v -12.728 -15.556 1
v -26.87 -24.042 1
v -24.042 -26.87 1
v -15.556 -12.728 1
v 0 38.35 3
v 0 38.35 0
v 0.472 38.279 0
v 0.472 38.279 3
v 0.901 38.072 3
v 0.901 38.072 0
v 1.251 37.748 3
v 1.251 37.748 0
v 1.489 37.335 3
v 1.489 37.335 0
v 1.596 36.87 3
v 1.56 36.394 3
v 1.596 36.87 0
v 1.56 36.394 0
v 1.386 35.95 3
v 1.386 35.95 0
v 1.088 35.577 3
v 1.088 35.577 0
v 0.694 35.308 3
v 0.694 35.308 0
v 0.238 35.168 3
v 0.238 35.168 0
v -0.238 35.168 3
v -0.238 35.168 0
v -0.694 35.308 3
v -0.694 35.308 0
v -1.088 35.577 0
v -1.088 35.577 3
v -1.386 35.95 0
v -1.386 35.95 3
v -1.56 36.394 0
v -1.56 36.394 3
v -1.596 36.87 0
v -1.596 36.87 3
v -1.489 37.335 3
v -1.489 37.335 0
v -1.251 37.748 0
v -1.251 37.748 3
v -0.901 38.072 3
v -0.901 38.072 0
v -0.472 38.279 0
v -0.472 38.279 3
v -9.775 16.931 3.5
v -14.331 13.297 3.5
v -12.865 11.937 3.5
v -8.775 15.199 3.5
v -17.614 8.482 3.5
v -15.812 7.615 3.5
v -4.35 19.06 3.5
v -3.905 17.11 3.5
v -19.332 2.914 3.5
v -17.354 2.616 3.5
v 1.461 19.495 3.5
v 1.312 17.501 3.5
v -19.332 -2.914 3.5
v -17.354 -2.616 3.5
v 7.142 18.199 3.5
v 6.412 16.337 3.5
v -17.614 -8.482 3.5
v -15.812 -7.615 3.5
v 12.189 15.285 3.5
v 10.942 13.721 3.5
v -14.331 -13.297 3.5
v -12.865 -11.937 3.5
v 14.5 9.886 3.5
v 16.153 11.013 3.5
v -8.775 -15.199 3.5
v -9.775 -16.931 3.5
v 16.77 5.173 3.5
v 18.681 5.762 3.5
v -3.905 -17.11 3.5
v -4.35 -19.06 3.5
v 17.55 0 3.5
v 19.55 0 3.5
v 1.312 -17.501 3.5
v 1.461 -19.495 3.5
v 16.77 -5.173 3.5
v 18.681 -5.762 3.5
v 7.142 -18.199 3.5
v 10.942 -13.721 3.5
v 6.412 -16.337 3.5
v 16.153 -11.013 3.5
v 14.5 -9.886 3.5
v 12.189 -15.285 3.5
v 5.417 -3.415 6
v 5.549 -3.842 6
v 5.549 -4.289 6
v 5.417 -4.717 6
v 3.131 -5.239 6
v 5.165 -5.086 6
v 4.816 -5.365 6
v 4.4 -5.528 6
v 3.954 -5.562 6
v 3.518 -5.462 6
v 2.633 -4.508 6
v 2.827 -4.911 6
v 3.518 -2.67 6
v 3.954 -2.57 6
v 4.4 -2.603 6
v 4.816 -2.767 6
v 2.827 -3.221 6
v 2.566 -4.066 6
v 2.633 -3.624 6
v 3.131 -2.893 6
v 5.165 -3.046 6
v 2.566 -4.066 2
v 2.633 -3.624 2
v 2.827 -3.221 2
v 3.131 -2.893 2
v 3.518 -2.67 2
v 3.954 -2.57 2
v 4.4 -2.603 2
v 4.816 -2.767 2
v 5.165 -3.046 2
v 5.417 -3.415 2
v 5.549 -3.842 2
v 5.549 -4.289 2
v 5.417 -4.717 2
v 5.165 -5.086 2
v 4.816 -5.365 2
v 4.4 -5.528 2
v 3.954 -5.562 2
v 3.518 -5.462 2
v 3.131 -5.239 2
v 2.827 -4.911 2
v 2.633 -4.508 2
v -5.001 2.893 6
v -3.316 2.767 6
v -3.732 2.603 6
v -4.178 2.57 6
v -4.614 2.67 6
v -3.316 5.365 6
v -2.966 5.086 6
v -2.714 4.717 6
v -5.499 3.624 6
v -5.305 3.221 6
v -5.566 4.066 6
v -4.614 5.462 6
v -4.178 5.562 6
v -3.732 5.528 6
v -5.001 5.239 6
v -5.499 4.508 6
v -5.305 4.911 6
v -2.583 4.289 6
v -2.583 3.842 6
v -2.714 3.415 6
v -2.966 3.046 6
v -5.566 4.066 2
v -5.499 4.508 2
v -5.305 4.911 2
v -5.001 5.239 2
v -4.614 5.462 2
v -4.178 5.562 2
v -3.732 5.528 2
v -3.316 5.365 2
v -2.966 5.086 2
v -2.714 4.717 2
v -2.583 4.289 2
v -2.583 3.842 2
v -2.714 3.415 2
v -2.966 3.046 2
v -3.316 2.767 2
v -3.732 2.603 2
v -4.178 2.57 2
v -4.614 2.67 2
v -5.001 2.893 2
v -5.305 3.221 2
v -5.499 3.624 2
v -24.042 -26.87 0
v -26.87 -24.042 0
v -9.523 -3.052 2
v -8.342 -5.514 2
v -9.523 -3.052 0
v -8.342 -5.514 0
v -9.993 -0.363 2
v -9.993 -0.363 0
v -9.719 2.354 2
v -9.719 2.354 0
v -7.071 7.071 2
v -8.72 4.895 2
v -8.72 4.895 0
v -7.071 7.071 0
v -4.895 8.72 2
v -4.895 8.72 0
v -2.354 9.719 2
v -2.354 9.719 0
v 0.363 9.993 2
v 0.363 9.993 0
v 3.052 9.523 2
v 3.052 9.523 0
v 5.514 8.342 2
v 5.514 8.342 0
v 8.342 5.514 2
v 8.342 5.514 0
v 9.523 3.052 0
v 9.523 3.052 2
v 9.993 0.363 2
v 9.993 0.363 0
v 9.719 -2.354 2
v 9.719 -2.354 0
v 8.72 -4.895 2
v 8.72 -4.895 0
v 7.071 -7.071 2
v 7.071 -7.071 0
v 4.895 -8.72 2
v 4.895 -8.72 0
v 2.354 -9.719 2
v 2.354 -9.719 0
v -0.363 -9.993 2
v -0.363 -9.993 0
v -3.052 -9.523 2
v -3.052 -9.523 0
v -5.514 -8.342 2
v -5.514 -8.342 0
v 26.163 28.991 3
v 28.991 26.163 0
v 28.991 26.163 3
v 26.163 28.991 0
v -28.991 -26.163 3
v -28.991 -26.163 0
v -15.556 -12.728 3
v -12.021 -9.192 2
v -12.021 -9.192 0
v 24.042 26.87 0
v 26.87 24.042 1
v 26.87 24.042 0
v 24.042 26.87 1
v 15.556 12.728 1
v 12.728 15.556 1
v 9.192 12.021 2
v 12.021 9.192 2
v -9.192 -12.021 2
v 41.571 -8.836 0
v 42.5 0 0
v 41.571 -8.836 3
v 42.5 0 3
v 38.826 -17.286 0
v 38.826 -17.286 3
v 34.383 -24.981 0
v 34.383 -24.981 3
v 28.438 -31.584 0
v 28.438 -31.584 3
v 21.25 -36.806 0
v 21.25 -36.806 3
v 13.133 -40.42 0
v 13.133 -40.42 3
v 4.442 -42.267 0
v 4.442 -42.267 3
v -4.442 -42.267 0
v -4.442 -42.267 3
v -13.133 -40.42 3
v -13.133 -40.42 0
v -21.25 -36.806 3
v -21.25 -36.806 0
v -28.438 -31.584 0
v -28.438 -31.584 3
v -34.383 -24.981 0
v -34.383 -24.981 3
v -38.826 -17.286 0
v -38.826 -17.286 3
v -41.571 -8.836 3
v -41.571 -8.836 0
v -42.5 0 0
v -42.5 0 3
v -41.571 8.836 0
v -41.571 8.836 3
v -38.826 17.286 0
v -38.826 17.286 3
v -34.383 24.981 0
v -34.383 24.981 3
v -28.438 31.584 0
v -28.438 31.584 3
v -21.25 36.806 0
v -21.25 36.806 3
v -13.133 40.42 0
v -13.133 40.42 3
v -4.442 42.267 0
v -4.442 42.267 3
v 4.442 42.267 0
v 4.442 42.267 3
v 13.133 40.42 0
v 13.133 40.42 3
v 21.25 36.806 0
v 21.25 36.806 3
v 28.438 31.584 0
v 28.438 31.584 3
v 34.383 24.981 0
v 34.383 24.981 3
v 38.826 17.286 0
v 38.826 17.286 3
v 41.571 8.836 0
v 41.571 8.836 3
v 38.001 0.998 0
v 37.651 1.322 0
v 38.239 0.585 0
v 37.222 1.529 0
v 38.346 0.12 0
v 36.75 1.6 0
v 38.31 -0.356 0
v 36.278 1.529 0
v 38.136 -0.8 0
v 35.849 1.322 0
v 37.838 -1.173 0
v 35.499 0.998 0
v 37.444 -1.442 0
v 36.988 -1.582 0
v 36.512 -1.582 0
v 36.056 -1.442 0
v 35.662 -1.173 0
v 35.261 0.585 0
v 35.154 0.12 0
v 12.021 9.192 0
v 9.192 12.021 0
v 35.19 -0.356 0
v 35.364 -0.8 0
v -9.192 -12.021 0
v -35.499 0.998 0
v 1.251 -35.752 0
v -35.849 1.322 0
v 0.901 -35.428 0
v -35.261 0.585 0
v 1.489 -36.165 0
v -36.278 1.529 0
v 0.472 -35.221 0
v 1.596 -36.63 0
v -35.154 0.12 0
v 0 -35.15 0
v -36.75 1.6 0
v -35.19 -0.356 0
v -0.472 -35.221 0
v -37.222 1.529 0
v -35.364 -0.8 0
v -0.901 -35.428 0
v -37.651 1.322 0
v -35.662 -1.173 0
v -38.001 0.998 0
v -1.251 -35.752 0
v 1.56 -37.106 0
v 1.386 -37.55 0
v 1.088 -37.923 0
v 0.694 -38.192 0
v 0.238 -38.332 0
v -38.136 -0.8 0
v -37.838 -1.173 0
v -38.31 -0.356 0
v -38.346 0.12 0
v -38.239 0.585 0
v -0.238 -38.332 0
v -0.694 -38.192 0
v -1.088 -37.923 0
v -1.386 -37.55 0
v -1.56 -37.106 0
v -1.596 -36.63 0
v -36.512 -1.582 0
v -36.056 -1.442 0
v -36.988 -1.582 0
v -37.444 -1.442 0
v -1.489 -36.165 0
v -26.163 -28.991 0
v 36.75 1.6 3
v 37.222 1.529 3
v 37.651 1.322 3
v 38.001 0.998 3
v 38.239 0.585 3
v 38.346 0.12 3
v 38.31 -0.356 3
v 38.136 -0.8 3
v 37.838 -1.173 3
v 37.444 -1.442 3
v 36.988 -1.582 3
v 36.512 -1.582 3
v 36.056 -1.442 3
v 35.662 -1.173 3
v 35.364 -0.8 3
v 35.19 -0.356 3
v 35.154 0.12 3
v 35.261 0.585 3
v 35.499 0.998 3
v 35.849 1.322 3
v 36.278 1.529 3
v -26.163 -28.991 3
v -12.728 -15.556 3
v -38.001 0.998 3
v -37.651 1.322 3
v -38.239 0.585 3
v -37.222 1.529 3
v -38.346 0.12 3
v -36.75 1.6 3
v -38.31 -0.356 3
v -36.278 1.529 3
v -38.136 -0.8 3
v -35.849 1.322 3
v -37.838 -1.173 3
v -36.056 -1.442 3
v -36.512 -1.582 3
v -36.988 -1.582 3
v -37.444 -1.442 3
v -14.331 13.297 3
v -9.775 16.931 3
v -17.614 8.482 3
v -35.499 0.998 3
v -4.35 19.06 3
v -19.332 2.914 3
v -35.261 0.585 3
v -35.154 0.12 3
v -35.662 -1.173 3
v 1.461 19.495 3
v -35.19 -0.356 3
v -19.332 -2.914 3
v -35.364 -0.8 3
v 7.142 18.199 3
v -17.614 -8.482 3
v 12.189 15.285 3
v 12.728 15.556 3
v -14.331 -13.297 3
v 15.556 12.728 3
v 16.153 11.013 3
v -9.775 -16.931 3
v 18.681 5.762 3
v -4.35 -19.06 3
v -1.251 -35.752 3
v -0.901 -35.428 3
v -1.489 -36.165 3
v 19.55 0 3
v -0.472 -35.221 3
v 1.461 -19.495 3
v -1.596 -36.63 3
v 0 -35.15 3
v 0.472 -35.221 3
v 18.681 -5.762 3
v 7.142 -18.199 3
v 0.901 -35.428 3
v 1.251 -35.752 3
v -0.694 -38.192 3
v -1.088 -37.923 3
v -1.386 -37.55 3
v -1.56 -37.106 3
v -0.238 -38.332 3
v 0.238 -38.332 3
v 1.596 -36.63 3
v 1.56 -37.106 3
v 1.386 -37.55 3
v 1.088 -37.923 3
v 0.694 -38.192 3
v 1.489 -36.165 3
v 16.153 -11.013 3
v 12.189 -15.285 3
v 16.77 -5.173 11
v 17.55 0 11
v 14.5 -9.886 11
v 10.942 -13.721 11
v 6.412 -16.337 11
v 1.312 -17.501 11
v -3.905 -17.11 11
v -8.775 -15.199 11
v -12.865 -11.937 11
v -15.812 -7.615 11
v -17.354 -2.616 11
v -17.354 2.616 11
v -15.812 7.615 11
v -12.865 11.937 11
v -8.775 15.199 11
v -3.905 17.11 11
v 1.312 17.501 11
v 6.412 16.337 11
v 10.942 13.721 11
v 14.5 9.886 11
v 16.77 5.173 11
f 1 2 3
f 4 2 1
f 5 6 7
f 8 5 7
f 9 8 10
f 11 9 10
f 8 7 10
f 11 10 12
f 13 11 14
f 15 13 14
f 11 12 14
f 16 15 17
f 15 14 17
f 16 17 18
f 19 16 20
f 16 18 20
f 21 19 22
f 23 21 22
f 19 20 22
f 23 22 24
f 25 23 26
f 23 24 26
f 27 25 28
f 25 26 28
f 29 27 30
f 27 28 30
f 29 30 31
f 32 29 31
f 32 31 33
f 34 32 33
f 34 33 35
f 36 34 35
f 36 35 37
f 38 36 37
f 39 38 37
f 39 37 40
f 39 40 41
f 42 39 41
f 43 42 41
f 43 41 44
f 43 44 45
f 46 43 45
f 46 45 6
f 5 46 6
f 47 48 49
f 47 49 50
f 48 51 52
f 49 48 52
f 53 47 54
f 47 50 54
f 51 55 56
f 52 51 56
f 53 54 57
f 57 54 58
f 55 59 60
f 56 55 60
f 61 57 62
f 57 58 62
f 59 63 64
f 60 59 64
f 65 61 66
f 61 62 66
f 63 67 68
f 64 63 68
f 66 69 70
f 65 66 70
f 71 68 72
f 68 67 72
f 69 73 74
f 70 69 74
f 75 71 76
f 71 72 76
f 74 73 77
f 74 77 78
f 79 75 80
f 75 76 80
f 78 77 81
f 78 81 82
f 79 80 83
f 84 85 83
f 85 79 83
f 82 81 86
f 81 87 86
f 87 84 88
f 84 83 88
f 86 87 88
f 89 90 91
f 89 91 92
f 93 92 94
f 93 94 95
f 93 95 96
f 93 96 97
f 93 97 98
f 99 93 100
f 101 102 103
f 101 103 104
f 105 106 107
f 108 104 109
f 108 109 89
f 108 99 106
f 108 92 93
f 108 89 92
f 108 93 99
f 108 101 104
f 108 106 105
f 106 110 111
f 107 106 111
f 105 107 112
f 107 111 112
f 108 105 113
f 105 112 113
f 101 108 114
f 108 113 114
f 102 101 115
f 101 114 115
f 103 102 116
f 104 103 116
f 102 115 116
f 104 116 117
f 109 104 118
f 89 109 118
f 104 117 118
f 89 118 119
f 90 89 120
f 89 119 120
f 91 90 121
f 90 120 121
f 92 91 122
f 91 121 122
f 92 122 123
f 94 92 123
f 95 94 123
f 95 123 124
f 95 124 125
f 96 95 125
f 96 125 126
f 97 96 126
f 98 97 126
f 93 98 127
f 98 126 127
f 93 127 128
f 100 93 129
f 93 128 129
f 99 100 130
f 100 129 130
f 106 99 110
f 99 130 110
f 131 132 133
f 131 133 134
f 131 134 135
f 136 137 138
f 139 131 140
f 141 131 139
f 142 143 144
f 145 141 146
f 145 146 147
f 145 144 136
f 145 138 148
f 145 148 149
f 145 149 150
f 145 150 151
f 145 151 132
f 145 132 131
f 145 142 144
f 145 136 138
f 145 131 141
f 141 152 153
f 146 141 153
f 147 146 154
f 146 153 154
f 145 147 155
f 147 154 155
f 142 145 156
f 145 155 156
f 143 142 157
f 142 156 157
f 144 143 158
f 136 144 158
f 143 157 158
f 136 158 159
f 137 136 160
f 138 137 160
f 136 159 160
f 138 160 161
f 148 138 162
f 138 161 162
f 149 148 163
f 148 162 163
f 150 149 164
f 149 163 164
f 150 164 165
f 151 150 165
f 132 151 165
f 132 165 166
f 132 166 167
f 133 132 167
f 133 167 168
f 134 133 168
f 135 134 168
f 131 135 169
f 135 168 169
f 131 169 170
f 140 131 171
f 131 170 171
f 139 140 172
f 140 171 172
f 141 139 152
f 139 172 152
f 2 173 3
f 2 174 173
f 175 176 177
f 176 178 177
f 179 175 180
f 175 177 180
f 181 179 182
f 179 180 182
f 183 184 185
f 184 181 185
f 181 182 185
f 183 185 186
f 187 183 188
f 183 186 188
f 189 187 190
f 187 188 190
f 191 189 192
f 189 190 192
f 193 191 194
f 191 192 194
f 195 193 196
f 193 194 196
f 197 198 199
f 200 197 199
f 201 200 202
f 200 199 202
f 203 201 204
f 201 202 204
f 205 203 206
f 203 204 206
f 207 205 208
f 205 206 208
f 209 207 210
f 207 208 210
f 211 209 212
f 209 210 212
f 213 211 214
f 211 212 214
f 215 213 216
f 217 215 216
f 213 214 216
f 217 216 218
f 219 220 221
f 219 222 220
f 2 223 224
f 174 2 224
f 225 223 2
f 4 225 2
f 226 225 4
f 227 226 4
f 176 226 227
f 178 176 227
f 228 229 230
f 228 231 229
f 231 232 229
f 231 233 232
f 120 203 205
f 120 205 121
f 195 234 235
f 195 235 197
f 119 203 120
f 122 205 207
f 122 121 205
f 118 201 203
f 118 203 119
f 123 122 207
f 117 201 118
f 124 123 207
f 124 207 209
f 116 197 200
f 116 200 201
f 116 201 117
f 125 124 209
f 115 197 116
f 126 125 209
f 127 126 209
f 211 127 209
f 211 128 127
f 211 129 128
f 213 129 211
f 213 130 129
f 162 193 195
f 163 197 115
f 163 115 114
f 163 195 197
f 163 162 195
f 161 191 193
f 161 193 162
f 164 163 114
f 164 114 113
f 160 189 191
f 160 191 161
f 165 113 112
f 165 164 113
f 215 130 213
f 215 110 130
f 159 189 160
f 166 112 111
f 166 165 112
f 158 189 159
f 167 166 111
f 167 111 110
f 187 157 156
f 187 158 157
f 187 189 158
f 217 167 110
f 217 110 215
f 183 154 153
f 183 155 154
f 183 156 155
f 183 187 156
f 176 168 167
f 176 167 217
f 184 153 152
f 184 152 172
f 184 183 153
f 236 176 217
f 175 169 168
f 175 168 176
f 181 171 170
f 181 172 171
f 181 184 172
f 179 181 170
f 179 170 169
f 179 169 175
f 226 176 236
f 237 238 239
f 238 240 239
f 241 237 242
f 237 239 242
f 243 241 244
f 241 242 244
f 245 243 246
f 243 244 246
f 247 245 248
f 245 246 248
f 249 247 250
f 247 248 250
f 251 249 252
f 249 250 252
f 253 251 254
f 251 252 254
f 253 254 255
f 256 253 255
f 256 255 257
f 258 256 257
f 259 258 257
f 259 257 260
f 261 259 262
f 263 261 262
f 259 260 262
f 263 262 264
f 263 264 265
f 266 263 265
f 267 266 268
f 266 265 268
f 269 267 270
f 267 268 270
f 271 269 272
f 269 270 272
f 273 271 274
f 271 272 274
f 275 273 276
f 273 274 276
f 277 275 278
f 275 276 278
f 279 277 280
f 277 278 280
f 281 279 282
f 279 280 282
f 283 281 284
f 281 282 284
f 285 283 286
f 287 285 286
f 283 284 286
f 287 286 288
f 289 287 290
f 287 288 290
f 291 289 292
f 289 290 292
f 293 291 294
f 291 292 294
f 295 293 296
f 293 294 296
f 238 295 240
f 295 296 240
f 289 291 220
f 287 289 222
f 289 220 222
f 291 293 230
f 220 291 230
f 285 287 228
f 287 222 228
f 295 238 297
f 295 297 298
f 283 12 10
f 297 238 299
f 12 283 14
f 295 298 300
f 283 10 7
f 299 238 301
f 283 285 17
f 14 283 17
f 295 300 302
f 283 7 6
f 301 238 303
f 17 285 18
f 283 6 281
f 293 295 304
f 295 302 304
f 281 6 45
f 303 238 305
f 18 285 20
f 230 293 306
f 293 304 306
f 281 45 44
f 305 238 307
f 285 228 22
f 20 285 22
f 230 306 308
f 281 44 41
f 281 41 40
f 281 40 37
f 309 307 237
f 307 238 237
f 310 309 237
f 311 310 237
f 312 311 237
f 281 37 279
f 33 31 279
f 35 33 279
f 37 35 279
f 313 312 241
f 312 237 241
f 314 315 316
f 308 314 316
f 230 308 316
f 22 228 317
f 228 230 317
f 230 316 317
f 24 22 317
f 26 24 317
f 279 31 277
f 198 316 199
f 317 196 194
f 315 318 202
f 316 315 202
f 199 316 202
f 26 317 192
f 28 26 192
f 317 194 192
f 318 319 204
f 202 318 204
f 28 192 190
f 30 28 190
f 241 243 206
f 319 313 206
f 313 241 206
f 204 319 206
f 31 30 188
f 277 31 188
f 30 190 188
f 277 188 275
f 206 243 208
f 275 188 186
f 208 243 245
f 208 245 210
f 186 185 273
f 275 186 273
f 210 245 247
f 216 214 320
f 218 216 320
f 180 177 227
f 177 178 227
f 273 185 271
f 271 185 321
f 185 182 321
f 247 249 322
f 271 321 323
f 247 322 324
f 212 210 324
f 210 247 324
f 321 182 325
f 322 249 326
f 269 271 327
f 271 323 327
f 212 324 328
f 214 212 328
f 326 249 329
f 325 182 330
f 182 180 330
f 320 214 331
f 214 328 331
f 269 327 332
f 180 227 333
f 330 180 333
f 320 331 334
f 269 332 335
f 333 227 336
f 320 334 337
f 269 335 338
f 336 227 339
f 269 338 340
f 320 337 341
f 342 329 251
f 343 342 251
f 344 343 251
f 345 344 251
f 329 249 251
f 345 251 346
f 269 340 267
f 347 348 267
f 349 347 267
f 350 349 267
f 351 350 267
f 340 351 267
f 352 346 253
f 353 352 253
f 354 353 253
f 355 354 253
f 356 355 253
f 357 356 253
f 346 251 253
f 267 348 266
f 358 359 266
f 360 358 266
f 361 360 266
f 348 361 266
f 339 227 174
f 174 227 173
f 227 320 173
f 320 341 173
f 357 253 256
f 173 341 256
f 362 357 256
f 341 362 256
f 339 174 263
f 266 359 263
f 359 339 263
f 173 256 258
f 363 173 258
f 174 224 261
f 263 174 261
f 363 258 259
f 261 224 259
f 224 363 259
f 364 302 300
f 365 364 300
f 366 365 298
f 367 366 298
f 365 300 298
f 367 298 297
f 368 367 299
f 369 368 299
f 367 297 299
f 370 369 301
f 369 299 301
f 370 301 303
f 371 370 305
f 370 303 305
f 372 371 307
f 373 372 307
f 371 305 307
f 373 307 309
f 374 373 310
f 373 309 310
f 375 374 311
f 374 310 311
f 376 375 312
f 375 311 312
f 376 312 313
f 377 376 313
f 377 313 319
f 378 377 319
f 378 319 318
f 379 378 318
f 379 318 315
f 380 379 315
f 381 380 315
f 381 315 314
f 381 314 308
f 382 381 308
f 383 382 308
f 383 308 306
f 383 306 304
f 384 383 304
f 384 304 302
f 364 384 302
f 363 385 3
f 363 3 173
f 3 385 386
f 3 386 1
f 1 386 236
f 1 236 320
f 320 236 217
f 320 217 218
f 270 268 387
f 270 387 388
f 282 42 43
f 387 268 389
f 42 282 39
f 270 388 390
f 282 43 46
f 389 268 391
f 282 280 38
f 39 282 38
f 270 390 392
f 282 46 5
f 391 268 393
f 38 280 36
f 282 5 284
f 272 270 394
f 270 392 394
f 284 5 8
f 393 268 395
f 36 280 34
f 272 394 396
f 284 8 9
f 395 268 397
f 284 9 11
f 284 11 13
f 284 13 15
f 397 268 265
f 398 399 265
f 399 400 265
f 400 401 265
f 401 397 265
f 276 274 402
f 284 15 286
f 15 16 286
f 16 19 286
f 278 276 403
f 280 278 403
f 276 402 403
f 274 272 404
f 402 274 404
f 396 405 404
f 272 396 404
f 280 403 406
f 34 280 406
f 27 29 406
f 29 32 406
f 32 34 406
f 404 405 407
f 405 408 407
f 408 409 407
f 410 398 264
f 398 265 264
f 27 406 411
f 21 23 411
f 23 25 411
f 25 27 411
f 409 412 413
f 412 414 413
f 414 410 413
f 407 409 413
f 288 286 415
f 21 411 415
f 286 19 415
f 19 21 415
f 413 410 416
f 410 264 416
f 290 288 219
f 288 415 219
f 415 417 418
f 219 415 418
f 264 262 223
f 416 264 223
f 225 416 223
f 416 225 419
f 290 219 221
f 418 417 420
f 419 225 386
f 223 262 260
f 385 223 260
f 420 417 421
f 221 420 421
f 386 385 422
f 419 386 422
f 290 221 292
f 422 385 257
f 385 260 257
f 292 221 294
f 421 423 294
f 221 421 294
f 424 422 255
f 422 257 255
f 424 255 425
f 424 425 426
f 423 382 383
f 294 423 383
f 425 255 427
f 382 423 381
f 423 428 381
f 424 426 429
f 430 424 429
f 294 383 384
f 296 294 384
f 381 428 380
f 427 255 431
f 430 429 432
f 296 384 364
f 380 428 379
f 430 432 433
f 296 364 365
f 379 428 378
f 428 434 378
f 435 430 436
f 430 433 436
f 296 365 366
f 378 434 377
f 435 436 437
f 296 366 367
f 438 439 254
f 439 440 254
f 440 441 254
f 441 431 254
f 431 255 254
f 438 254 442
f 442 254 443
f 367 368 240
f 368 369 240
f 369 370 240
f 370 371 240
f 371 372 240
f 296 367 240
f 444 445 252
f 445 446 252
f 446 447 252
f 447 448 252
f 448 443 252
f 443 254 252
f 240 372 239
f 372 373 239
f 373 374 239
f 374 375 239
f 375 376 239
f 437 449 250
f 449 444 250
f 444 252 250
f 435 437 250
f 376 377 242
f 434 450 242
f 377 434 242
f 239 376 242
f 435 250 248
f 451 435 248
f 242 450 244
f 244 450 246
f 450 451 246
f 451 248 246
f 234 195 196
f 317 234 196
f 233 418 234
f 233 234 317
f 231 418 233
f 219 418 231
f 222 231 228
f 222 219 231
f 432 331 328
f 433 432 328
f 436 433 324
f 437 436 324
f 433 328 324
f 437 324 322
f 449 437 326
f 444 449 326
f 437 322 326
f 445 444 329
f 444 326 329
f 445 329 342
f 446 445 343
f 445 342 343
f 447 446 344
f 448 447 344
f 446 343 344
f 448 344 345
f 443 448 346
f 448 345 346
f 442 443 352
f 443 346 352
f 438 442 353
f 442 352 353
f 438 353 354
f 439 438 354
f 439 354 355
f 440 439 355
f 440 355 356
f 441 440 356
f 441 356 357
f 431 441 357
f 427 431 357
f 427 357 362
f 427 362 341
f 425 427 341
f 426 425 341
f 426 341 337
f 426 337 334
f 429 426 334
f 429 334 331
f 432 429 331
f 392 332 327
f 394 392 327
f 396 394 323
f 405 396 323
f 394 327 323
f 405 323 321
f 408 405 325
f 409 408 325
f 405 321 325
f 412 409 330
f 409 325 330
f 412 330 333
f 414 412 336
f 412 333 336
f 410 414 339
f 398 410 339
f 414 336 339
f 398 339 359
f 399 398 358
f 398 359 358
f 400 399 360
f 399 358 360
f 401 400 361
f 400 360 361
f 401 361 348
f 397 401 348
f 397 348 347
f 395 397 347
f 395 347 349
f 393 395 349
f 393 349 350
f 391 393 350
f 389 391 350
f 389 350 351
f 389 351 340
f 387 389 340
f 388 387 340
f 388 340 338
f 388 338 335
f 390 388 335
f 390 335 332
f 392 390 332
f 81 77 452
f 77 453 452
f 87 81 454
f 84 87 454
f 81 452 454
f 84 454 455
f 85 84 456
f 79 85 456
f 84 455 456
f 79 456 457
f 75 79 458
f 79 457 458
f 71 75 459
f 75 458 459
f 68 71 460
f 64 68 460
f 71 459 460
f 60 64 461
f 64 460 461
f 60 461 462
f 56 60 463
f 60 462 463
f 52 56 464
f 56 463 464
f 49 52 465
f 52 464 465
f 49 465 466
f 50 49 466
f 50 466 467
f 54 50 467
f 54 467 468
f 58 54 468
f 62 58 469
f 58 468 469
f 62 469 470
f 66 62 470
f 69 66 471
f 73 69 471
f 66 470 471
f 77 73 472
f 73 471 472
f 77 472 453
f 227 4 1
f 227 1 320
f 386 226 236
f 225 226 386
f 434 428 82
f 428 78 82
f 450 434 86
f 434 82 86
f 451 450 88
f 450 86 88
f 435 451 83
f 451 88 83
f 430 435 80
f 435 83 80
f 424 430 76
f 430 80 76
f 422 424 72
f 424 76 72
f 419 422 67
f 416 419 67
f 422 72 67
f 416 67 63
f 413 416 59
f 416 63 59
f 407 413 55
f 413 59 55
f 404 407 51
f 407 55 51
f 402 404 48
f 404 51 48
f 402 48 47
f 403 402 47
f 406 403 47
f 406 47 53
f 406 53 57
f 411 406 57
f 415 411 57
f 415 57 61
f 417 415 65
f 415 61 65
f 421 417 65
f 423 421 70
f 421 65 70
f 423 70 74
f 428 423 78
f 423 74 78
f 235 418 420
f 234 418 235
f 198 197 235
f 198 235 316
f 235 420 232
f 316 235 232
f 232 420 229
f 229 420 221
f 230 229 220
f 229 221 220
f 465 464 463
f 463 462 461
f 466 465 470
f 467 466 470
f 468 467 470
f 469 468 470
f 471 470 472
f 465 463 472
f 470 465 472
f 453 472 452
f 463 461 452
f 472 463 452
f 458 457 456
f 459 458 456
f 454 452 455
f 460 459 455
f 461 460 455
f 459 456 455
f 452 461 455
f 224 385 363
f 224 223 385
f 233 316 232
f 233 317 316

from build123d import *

# Parameters (mm, degrees)
SKETCH2_R           = 1.6
CUT_EXTRUDE1_DEPTH  = 62.102373113
SKETCH8_R           = 10
CUT_EXTRUDE6_DEPTH  = 2
SKETCH16_R          = 1.5
CUT_EXTRUDE7_DEPTH  = 4
CUT_EXTRUDE10_DEPTH = 2


with BuildPart() as part:
    # Sketch1 → Revolve1 (revolve)
    with BuildSketch(Plane(origin=(0, 0, 0), x_dir=(0, 0, -1), z_dir=(1, 0, 0)), mode=Mode.PRIVATE) as revolve1_sk:
        Polygon((0, 0), (0, 42.5), (-3, 42.5), (-3, 19.55), (-3.5, 19.55), (-3.5, 17.55), (-11, 17.55), (-11, 0), align=None)
    revolve(revolve1_sk.sketch.rotate(Axis((0, 0, 11), (0, 0, -1)), 90), axis=Axis((0, 0, 11), (0, 0, -1)))

    # Sketch2 → Cut-Extrude1 (cut, through all)
    with BuildSketch(Plane(origin=(0, 0, 0), x_dir=(-1, 0, 0), z_dir=(0, 0, -1))):
        with Locations(Location((0, 36.75, 0), (0, 0, 90))):
            Circle(SKETCH2_R)
        with Locations(Location((36.75, 0, 0), (0, 0, 90))):
            Circle(SKETCH2_R)
        with Locations(Location((0, -36.75, 0), (0, 0, 90))):
            Circle(SKETCH2_R)
        with Locations(Location((-36.75, 0, 0), (0, 0, 90))):
            Circle(SKETCH2_R)
    extrude(amount=-CUT_EXTRUDE1_DEPTH, mode=Mode.SUBTRACT)

    # Sketch8 → Cut-Extrude6 (cut)
    with BuildSketch(Plane(origin=(0, 0, 0), x_dir=(-1, 0, 0), z_dir=(0, 0, -1))):
        Circle(SKETCH8_R)
    extrude(amount=-CUT_EXTRUDE6_DEPTH, mode=Mode.SUBTRACT)

    # Sketch16 → Cut-Extrude7 (cut)
    with BuildSketch(Plane(origin=(0, 0, 2), x_dir=(-1, 0, 0), z_dir=(0, 0, -1))):
        with Locations((4.065863992, 4.065863992)):
            Circle(SKETCH16_R)
        with Locations((-4.065863992, -4.065863992)):
            Circle(SKETCH16_R)
    extrude(amount=-CUT_EXTRUDE7_DEPTH, mode=Mode.SUBTRACT)

    # Sketch19 → Cut-Extrude10 (cut, symmetric)
    with BuildSketch(Plane(origin=(0, 0, 0), x_dir=(0, 0, 1), z_dir=(-0.7071067811865487, 0.7071067811865465, 0))):
        Polygon((0, -15), (0, 15), (1, 20), (1, 36), (0, 36), (0, 39), (3, 39), (3, 20), (2, 15), (2, -15), (3, -20), (3, -39), (0, -39), (0, -36), (1, -36), (1, -20), align=None)
    extrude(amount=CUT_EXTRUDE10_DEPTH, both=True, mode=Mode.SUBTRACT)


solid = part.part
